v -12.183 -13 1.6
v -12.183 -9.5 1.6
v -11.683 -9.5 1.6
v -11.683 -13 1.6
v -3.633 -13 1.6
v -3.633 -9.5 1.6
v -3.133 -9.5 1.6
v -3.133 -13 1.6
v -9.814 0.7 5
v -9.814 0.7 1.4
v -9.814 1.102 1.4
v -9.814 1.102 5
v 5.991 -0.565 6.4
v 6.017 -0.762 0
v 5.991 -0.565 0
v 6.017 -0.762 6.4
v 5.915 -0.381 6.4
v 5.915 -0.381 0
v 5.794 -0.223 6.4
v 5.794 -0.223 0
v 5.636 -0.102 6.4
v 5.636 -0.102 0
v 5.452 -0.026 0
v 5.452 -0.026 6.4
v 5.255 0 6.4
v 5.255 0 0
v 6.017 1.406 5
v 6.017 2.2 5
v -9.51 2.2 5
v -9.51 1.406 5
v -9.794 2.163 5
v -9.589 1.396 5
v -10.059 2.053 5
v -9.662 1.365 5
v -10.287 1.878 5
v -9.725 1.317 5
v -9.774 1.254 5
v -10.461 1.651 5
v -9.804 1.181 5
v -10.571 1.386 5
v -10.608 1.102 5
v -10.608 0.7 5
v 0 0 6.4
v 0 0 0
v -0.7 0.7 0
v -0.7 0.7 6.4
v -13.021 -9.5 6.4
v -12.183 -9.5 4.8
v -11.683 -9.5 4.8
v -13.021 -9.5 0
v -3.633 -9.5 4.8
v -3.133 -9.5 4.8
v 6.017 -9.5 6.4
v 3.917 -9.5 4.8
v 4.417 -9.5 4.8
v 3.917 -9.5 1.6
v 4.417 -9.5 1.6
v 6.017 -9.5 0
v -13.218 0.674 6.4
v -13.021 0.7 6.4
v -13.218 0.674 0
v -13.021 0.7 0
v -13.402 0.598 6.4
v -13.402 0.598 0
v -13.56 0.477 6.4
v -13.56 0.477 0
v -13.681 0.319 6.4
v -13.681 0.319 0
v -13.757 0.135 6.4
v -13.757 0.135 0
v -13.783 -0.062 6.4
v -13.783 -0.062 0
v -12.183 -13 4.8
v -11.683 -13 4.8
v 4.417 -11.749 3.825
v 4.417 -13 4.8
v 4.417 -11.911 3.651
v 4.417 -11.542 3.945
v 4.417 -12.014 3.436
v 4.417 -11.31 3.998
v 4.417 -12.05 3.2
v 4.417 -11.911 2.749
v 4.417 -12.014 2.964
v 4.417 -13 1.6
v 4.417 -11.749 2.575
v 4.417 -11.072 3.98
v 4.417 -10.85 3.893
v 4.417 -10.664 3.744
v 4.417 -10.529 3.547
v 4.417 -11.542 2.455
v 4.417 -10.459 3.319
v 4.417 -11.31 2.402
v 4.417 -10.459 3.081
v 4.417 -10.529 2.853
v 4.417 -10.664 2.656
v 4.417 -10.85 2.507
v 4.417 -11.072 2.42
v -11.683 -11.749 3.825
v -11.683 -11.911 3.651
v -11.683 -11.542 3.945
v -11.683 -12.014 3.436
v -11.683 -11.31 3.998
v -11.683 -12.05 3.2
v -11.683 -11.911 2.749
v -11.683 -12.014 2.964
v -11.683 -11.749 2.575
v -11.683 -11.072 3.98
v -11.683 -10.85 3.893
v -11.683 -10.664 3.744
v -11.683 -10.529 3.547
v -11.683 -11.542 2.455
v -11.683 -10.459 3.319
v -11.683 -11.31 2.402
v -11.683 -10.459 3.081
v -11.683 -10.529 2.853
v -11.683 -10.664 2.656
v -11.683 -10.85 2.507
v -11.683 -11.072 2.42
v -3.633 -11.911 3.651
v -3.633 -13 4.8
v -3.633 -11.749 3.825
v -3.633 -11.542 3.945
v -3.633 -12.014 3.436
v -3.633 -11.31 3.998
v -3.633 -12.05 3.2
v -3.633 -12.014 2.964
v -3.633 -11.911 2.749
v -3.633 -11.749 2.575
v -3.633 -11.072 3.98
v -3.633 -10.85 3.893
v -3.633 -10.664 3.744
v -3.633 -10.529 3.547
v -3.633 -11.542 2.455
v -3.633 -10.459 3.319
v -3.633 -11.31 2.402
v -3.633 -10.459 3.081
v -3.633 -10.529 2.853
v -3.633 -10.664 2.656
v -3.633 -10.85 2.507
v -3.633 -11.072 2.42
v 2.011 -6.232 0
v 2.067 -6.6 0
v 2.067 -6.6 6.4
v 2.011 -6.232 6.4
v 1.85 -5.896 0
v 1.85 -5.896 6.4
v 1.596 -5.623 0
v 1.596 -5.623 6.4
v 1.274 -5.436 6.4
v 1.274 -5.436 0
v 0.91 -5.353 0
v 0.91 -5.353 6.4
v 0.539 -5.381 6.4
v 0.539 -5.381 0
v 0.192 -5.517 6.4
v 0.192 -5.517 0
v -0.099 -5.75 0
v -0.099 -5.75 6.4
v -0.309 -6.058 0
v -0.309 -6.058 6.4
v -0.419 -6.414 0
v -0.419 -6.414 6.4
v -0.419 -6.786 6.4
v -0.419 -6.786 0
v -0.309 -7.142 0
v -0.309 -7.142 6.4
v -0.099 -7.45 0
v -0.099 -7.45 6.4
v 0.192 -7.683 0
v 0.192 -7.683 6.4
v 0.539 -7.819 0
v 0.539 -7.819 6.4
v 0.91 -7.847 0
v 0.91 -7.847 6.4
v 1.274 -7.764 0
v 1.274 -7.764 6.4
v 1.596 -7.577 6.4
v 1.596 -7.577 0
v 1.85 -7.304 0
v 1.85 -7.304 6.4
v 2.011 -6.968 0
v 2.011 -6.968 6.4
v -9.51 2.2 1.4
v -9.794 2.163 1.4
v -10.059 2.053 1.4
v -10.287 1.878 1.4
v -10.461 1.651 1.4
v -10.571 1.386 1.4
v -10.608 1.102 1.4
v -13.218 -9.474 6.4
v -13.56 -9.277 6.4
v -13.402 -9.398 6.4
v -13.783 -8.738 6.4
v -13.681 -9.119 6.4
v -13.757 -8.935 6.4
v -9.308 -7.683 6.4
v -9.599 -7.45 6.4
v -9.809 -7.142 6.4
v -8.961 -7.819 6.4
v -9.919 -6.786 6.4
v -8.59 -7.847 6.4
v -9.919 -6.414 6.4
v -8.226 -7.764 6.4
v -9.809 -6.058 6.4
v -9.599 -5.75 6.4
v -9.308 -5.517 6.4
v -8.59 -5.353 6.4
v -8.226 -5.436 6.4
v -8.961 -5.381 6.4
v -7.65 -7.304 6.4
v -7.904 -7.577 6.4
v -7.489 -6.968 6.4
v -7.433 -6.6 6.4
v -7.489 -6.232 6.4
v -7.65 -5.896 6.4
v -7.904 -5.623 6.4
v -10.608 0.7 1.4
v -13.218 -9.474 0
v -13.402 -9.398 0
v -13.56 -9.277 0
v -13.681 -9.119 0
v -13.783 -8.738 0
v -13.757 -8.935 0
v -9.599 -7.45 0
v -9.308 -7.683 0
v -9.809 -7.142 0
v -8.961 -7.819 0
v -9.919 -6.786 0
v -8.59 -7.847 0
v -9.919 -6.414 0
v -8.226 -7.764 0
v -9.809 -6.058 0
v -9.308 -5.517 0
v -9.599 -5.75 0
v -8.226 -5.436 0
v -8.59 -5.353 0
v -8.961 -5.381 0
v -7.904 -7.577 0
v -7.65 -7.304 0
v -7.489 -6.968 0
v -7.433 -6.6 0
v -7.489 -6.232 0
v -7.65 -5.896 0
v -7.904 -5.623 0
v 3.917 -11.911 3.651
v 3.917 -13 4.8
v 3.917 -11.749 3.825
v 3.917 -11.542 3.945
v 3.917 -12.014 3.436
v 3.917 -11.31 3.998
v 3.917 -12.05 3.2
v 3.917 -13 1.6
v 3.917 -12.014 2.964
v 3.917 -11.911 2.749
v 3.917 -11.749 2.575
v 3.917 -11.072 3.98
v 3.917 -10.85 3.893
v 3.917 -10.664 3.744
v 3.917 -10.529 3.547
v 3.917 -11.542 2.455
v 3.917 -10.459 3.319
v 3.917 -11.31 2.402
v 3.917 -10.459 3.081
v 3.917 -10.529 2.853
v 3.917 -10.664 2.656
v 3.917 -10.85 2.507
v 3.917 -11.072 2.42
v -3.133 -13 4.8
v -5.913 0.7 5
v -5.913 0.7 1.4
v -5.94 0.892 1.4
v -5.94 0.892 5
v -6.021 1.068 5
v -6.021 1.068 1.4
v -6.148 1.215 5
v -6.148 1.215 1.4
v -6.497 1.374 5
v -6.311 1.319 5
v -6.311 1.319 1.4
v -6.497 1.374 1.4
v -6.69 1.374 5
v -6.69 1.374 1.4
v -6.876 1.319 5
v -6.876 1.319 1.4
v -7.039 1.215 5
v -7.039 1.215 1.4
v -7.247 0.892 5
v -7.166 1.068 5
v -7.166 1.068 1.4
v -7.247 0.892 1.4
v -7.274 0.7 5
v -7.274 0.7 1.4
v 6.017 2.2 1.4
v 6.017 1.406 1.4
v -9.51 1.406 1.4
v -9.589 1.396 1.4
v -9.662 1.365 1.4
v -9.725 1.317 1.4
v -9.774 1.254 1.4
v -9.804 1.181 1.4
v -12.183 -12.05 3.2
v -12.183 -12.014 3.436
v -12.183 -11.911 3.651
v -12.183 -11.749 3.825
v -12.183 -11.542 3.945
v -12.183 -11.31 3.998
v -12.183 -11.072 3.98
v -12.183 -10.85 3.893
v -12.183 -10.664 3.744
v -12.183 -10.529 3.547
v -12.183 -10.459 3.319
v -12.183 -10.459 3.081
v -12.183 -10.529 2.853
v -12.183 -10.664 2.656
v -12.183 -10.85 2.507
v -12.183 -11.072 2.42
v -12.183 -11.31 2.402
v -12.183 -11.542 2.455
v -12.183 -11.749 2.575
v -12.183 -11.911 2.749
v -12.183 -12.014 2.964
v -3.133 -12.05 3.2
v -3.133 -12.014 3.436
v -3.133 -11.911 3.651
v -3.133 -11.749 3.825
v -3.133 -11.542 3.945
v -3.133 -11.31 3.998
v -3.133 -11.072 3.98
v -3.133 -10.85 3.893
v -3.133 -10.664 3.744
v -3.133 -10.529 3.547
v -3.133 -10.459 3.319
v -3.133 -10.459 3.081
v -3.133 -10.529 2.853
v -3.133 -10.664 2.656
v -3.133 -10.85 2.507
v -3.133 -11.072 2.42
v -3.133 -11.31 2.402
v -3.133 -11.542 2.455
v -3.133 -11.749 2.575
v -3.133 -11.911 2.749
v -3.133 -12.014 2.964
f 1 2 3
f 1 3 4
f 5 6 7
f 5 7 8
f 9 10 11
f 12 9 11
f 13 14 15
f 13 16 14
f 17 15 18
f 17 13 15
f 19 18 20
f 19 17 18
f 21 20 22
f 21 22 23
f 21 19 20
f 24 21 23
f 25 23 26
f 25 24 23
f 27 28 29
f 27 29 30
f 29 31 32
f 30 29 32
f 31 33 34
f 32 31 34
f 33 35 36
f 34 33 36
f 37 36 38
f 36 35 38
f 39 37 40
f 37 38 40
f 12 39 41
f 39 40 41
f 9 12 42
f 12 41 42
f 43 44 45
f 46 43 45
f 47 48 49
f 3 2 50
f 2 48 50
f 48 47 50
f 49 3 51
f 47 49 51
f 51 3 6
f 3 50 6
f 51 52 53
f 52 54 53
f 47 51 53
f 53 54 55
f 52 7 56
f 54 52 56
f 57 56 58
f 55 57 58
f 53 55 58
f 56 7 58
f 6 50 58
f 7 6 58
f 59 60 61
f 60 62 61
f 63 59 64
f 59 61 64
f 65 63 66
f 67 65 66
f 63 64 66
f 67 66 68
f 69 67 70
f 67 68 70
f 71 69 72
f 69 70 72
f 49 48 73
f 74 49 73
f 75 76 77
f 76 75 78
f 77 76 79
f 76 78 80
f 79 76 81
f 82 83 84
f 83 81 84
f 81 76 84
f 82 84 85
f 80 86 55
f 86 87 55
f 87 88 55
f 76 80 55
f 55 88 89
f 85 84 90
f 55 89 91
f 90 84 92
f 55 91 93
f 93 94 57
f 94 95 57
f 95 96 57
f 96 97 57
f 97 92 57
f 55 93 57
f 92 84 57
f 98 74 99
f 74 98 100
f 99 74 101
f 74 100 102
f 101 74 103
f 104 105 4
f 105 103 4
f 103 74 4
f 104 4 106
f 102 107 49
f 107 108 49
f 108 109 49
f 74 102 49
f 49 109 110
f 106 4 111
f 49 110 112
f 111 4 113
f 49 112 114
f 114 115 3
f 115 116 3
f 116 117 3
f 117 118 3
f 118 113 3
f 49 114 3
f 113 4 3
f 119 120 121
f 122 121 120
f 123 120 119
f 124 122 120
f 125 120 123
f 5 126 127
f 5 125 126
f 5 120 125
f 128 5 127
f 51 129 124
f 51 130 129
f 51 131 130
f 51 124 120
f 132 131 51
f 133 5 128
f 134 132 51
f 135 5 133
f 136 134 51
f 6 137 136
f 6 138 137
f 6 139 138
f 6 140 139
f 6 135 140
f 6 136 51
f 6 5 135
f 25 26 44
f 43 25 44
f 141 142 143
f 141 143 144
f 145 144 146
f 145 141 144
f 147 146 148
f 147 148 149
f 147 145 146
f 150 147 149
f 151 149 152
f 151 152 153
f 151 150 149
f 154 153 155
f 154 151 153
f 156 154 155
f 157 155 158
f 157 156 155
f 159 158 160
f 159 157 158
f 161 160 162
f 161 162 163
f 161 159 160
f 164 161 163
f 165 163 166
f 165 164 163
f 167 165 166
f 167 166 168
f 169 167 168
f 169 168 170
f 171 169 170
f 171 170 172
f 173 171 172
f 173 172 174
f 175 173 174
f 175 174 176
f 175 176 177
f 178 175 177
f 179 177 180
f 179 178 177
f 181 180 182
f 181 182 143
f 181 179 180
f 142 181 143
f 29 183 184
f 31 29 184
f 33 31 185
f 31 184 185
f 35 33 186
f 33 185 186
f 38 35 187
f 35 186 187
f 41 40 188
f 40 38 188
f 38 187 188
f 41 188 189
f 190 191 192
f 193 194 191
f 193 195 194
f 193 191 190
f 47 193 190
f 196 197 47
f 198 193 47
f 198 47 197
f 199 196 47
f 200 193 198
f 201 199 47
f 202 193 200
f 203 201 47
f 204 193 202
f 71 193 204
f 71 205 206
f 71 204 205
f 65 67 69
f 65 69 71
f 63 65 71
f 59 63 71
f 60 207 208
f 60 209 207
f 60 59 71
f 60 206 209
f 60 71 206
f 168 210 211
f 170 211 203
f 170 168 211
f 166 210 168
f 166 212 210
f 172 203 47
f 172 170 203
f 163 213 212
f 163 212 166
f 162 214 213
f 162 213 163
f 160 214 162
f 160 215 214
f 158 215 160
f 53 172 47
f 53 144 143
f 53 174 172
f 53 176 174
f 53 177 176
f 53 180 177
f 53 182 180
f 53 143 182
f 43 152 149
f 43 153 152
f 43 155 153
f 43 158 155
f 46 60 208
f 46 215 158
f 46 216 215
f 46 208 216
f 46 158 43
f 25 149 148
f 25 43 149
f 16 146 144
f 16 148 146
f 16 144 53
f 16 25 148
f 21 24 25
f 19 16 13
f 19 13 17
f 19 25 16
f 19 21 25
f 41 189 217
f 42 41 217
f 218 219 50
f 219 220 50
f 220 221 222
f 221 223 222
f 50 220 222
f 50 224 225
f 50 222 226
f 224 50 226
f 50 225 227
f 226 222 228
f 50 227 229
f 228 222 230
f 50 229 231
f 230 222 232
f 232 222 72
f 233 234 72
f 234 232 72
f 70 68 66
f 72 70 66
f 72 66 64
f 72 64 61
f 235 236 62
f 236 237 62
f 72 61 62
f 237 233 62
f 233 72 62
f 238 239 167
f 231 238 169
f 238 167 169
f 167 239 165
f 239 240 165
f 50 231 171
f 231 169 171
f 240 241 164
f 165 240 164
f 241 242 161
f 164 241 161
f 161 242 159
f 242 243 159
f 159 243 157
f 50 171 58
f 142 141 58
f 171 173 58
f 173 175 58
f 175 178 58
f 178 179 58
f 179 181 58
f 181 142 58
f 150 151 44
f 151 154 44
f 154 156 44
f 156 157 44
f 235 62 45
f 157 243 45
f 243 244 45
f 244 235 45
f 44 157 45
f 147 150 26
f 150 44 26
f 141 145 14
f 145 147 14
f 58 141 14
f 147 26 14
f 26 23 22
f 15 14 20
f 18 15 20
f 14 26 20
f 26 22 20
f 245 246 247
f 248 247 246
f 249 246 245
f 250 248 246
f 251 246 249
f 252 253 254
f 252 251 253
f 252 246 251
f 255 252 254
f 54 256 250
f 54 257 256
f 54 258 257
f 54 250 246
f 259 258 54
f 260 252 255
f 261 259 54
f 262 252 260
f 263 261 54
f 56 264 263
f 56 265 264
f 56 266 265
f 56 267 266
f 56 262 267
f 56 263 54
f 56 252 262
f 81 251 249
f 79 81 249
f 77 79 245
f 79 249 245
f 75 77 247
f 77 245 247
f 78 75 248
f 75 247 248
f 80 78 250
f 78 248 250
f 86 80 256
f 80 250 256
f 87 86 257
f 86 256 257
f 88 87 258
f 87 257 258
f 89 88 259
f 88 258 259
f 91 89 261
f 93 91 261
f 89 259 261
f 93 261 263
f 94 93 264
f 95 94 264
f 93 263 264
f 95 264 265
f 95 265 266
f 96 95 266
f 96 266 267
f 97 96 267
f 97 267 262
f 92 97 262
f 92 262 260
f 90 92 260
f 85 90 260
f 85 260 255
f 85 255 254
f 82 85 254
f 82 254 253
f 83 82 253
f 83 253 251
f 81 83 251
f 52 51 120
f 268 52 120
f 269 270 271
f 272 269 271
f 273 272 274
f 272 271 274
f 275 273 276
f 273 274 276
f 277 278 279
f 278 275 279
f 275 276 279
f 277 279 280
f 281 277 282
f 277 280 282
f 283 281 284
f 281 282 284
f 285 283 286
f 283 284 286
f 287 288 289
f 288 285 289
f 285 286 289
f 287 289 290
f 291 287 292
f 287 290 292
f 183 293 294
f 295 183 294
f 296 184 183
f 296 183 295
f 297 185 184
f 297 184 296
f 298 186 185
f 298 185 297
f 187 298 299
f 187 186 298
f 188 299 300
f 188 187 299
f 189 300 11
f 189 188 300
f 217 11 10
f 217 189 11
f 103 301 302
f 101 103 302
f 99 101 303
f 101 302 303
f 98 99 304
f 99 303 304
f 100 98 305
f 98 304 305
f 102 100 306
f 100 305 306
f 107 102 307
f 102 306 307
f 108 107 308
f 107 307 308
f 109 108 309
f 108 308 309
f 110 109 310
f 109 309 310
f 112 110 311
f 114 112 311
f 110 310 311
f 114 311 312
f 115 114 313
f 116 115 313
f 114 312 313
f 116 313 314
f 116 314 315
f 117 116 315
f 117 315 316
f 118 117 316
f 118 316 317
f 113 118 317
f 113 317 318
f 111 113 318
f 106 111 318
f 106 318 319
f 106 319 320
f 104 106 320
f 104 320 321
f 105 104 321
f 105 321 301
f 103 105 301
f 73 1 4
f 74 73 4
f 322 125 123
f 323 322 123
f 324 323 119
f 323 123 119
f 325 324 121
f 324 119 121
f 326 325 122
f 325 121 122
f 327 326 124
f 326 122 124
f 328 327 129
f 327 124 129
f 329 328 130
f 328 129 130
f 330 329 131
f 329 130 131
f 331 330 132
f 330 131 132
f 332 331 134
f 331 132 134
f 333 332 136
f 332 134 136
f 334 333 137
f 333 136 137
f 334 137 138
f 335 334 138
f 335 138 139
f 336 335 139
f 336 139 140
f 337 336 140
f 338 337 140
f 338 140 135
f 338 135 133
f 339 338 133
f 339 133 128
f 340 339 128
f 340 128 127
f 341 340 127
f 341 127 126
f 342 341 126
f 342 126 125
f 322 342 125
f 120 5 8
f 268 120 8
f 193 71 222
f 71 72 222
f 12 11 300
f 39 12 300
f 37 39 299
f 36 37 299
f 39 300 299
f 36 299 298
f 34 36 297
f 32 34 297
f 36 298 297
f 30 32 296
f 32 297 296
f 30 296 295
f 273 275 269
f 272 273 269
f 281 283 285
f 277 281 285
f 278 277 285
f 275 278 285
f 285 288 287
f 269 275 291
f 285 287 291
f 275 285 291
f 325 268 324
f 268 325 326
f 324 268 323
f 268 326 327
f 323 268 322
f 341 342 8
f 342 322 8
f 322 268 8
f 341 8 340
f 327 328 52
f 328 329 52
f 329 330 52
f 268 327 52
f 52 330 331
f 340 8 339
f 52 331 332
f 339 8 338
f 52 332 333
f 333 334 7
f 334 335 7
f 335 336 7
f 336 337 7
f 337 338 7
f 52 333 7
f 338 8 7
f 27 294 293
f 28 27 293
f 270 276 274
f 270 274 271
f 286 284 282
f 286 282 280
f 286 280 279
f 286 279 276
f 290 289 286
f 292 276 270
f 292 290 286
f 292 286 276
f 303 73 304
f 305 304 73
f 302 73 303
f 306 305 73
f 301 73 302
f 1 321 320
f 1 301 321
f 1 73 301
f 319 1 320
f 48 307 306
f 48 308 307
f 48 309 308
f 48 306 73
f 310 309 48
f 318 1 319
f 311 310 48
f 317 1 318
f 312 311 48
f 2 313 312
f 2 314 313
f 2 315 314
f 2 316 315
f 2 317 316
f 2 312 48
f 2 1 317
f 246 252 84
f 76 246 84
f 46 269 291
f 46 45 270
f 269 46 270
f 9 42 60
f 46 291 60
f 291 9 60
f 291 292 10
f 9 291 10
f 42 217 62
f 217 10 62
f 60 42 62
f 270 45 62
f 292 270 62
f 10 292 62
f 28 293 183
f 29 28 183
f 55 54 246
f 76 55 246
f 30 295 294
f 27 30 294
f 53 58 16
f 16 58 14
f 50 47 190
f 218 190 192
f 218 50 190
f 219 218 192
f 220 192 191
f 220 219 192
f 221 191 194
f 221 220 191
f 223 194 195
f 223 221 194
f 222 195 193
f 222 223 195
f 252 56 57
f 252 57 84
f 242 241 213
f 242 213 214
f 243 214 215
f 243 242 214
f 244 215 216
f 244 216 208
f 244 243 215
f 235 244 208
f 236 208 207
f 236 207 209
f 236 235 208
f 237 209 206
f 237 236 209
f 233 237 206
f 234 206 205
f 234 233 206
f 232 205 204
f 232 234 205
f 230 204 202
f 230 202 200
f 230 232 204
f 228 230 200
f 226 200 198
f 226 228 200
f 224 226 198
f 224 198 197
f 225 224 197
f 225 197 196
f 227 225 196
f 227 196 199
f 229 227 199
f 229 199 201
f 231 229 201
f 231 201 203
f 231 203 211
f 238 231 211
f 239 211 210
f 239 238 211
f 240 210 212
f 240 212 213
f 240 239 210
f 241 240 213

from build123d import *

# Parameters (mm, degrees)
F0_W     = 0.5
F0_H     = 3.5
F0_R     = 1.25
F1_DEPTH = 6.4
F2_W     = 1.5
F2_H     = 1.4
F2_W_2   = 3.5
F2_H_2   = 1.6
F2_R     = 0.8
F3_DEPTH = 19.8
F4_R     = 0.762


with BuildPart() as f1:
    # F0 (on Top) → F1 (new body)
    with BuildSketch(Plane.XY):
        with Locations((4.1668843009, -11.25)):
            Rectangle(F0_W, F0_H)
        with Locations((-3.3831156991, -11.25)):
            Rectangle(F0_W, F0_H)
        with Locations((-11.9331156991, -11.25)):
            Rectangle(F0_W, F0_H)
        with BuildLine():
            Line((-10.6081156991, 0.7), (-9.8143656991, 0.7))
            Line((-9.8143656991, 0.7), (-9.8143656991, 1.101979753))
            ThreePointArc((-9.8143656991, 1.101979753), (-9.7252470071, 1.317131308), (-9.5100954521, 1.40625))
            Line((-9.5100954521, 1.40625), (6.0168843009, 1.40625))
            Line((6.0168843009, 1.40625), (6.0168843009, 2.2))
            Line((6.0168843009, 2.2), (-9.5100954521, 2.2))
            ThreePointArc((-9.5100954521, 2.2), (-10.2865130147, 1.8783973155), (-10.6081156991, 1.101979753))
            Line((-10.6081156991, 1.101979753), (-10.6081156991, 0.7))
        make_face()
        with BuildLine():
            Line((6.0168843009, 0), (0, 0))
            Line((0, 0), (-0.7, 0.7))
            Line((-0.7, 0.7), (-5.9126656991, 0.7))
            ThreePointArc((-5.9126656991, 0.7), (-6.5935156991, 1.38085), (-7.2743656991, 0.7))
            Line((-7.2743656991, 0.7), (-9.8143656991, 0.7))
            Line((-9.8143656991, 0.7), (-10.6081156991, 0.7))
            Line((-10.6081156991, 0.7), (-13.7831156991, 0.7))
            Line((-13.7831156991, 0.7), (-13.7831156991, -9.5))
            Line((-13.7831156991, -9.5), (-12.1831156991, -9.5))
            Line((-12.1831156991, -9.5), (-11.6831156991, -9.5))
            Line((-11.6831156991, -9.5), (-3.6331156991, -9.5))
            Line((-3.6331156991, -9.5), (-3.1331156991, -9.5))
            Line((-3.1331156991, -9.5), (3.9168843009, -9.5))
            Line((3.9168843009, -9.5), (4.4168843009, -9.5))
            Line((4.4168843009, -9.5), (6.0168843009, -9.5))
            Line((6.0168843009, -9.5), (6.0168843009, 0))
        make_face()
        with Locations((-8.6831156991, -6.6)):
            Circle(F0_R, mode=Mode.SUBTRACT)
        with Locations((0.8168843009, -6.6)):
            Circle(F0_R, mode=Mode.SUBTRACT)
    extrude(amount=F1_DEPTH)

    # F2 (on face) → F3 (cut, through all)
    with BuildSketch(Plane(origin=(-13.7831156991, 0, 0), x_dir=(0, -1, 0), z_dir=(-1, 0, 0))):
        with Locations((-1.45, 0.7)):
            Rectangle(F2_W, F2_H)
        with Locations((-1.45, 5.7)):
            Rectangle(F2_W, F2_H)
        with Locations((11.25, 0.8)):
            Rectangle(F2_W_2, F2_H_2)
        with Locations((11.25, 5.6)):
            Rectangle(F2_W_2, F2_H_2)
        with Locations((11.25, 3.2)):
            Circle(F2_R)
    extrude(amount=-F3_DEPTH, mode=Mode.SUBTRACT)

    # F4
    f4_edges = [f1.edges().sort_by_distance(p)[0] for p in [
        (-13.783116, -9.5, 3.2),
        (6.016884, 0, 3.2),
        (-13.783116, 0.7, 3.2),
    ]]
    fillet(f4_edges, radius=F4_R)


solid = f1.part
